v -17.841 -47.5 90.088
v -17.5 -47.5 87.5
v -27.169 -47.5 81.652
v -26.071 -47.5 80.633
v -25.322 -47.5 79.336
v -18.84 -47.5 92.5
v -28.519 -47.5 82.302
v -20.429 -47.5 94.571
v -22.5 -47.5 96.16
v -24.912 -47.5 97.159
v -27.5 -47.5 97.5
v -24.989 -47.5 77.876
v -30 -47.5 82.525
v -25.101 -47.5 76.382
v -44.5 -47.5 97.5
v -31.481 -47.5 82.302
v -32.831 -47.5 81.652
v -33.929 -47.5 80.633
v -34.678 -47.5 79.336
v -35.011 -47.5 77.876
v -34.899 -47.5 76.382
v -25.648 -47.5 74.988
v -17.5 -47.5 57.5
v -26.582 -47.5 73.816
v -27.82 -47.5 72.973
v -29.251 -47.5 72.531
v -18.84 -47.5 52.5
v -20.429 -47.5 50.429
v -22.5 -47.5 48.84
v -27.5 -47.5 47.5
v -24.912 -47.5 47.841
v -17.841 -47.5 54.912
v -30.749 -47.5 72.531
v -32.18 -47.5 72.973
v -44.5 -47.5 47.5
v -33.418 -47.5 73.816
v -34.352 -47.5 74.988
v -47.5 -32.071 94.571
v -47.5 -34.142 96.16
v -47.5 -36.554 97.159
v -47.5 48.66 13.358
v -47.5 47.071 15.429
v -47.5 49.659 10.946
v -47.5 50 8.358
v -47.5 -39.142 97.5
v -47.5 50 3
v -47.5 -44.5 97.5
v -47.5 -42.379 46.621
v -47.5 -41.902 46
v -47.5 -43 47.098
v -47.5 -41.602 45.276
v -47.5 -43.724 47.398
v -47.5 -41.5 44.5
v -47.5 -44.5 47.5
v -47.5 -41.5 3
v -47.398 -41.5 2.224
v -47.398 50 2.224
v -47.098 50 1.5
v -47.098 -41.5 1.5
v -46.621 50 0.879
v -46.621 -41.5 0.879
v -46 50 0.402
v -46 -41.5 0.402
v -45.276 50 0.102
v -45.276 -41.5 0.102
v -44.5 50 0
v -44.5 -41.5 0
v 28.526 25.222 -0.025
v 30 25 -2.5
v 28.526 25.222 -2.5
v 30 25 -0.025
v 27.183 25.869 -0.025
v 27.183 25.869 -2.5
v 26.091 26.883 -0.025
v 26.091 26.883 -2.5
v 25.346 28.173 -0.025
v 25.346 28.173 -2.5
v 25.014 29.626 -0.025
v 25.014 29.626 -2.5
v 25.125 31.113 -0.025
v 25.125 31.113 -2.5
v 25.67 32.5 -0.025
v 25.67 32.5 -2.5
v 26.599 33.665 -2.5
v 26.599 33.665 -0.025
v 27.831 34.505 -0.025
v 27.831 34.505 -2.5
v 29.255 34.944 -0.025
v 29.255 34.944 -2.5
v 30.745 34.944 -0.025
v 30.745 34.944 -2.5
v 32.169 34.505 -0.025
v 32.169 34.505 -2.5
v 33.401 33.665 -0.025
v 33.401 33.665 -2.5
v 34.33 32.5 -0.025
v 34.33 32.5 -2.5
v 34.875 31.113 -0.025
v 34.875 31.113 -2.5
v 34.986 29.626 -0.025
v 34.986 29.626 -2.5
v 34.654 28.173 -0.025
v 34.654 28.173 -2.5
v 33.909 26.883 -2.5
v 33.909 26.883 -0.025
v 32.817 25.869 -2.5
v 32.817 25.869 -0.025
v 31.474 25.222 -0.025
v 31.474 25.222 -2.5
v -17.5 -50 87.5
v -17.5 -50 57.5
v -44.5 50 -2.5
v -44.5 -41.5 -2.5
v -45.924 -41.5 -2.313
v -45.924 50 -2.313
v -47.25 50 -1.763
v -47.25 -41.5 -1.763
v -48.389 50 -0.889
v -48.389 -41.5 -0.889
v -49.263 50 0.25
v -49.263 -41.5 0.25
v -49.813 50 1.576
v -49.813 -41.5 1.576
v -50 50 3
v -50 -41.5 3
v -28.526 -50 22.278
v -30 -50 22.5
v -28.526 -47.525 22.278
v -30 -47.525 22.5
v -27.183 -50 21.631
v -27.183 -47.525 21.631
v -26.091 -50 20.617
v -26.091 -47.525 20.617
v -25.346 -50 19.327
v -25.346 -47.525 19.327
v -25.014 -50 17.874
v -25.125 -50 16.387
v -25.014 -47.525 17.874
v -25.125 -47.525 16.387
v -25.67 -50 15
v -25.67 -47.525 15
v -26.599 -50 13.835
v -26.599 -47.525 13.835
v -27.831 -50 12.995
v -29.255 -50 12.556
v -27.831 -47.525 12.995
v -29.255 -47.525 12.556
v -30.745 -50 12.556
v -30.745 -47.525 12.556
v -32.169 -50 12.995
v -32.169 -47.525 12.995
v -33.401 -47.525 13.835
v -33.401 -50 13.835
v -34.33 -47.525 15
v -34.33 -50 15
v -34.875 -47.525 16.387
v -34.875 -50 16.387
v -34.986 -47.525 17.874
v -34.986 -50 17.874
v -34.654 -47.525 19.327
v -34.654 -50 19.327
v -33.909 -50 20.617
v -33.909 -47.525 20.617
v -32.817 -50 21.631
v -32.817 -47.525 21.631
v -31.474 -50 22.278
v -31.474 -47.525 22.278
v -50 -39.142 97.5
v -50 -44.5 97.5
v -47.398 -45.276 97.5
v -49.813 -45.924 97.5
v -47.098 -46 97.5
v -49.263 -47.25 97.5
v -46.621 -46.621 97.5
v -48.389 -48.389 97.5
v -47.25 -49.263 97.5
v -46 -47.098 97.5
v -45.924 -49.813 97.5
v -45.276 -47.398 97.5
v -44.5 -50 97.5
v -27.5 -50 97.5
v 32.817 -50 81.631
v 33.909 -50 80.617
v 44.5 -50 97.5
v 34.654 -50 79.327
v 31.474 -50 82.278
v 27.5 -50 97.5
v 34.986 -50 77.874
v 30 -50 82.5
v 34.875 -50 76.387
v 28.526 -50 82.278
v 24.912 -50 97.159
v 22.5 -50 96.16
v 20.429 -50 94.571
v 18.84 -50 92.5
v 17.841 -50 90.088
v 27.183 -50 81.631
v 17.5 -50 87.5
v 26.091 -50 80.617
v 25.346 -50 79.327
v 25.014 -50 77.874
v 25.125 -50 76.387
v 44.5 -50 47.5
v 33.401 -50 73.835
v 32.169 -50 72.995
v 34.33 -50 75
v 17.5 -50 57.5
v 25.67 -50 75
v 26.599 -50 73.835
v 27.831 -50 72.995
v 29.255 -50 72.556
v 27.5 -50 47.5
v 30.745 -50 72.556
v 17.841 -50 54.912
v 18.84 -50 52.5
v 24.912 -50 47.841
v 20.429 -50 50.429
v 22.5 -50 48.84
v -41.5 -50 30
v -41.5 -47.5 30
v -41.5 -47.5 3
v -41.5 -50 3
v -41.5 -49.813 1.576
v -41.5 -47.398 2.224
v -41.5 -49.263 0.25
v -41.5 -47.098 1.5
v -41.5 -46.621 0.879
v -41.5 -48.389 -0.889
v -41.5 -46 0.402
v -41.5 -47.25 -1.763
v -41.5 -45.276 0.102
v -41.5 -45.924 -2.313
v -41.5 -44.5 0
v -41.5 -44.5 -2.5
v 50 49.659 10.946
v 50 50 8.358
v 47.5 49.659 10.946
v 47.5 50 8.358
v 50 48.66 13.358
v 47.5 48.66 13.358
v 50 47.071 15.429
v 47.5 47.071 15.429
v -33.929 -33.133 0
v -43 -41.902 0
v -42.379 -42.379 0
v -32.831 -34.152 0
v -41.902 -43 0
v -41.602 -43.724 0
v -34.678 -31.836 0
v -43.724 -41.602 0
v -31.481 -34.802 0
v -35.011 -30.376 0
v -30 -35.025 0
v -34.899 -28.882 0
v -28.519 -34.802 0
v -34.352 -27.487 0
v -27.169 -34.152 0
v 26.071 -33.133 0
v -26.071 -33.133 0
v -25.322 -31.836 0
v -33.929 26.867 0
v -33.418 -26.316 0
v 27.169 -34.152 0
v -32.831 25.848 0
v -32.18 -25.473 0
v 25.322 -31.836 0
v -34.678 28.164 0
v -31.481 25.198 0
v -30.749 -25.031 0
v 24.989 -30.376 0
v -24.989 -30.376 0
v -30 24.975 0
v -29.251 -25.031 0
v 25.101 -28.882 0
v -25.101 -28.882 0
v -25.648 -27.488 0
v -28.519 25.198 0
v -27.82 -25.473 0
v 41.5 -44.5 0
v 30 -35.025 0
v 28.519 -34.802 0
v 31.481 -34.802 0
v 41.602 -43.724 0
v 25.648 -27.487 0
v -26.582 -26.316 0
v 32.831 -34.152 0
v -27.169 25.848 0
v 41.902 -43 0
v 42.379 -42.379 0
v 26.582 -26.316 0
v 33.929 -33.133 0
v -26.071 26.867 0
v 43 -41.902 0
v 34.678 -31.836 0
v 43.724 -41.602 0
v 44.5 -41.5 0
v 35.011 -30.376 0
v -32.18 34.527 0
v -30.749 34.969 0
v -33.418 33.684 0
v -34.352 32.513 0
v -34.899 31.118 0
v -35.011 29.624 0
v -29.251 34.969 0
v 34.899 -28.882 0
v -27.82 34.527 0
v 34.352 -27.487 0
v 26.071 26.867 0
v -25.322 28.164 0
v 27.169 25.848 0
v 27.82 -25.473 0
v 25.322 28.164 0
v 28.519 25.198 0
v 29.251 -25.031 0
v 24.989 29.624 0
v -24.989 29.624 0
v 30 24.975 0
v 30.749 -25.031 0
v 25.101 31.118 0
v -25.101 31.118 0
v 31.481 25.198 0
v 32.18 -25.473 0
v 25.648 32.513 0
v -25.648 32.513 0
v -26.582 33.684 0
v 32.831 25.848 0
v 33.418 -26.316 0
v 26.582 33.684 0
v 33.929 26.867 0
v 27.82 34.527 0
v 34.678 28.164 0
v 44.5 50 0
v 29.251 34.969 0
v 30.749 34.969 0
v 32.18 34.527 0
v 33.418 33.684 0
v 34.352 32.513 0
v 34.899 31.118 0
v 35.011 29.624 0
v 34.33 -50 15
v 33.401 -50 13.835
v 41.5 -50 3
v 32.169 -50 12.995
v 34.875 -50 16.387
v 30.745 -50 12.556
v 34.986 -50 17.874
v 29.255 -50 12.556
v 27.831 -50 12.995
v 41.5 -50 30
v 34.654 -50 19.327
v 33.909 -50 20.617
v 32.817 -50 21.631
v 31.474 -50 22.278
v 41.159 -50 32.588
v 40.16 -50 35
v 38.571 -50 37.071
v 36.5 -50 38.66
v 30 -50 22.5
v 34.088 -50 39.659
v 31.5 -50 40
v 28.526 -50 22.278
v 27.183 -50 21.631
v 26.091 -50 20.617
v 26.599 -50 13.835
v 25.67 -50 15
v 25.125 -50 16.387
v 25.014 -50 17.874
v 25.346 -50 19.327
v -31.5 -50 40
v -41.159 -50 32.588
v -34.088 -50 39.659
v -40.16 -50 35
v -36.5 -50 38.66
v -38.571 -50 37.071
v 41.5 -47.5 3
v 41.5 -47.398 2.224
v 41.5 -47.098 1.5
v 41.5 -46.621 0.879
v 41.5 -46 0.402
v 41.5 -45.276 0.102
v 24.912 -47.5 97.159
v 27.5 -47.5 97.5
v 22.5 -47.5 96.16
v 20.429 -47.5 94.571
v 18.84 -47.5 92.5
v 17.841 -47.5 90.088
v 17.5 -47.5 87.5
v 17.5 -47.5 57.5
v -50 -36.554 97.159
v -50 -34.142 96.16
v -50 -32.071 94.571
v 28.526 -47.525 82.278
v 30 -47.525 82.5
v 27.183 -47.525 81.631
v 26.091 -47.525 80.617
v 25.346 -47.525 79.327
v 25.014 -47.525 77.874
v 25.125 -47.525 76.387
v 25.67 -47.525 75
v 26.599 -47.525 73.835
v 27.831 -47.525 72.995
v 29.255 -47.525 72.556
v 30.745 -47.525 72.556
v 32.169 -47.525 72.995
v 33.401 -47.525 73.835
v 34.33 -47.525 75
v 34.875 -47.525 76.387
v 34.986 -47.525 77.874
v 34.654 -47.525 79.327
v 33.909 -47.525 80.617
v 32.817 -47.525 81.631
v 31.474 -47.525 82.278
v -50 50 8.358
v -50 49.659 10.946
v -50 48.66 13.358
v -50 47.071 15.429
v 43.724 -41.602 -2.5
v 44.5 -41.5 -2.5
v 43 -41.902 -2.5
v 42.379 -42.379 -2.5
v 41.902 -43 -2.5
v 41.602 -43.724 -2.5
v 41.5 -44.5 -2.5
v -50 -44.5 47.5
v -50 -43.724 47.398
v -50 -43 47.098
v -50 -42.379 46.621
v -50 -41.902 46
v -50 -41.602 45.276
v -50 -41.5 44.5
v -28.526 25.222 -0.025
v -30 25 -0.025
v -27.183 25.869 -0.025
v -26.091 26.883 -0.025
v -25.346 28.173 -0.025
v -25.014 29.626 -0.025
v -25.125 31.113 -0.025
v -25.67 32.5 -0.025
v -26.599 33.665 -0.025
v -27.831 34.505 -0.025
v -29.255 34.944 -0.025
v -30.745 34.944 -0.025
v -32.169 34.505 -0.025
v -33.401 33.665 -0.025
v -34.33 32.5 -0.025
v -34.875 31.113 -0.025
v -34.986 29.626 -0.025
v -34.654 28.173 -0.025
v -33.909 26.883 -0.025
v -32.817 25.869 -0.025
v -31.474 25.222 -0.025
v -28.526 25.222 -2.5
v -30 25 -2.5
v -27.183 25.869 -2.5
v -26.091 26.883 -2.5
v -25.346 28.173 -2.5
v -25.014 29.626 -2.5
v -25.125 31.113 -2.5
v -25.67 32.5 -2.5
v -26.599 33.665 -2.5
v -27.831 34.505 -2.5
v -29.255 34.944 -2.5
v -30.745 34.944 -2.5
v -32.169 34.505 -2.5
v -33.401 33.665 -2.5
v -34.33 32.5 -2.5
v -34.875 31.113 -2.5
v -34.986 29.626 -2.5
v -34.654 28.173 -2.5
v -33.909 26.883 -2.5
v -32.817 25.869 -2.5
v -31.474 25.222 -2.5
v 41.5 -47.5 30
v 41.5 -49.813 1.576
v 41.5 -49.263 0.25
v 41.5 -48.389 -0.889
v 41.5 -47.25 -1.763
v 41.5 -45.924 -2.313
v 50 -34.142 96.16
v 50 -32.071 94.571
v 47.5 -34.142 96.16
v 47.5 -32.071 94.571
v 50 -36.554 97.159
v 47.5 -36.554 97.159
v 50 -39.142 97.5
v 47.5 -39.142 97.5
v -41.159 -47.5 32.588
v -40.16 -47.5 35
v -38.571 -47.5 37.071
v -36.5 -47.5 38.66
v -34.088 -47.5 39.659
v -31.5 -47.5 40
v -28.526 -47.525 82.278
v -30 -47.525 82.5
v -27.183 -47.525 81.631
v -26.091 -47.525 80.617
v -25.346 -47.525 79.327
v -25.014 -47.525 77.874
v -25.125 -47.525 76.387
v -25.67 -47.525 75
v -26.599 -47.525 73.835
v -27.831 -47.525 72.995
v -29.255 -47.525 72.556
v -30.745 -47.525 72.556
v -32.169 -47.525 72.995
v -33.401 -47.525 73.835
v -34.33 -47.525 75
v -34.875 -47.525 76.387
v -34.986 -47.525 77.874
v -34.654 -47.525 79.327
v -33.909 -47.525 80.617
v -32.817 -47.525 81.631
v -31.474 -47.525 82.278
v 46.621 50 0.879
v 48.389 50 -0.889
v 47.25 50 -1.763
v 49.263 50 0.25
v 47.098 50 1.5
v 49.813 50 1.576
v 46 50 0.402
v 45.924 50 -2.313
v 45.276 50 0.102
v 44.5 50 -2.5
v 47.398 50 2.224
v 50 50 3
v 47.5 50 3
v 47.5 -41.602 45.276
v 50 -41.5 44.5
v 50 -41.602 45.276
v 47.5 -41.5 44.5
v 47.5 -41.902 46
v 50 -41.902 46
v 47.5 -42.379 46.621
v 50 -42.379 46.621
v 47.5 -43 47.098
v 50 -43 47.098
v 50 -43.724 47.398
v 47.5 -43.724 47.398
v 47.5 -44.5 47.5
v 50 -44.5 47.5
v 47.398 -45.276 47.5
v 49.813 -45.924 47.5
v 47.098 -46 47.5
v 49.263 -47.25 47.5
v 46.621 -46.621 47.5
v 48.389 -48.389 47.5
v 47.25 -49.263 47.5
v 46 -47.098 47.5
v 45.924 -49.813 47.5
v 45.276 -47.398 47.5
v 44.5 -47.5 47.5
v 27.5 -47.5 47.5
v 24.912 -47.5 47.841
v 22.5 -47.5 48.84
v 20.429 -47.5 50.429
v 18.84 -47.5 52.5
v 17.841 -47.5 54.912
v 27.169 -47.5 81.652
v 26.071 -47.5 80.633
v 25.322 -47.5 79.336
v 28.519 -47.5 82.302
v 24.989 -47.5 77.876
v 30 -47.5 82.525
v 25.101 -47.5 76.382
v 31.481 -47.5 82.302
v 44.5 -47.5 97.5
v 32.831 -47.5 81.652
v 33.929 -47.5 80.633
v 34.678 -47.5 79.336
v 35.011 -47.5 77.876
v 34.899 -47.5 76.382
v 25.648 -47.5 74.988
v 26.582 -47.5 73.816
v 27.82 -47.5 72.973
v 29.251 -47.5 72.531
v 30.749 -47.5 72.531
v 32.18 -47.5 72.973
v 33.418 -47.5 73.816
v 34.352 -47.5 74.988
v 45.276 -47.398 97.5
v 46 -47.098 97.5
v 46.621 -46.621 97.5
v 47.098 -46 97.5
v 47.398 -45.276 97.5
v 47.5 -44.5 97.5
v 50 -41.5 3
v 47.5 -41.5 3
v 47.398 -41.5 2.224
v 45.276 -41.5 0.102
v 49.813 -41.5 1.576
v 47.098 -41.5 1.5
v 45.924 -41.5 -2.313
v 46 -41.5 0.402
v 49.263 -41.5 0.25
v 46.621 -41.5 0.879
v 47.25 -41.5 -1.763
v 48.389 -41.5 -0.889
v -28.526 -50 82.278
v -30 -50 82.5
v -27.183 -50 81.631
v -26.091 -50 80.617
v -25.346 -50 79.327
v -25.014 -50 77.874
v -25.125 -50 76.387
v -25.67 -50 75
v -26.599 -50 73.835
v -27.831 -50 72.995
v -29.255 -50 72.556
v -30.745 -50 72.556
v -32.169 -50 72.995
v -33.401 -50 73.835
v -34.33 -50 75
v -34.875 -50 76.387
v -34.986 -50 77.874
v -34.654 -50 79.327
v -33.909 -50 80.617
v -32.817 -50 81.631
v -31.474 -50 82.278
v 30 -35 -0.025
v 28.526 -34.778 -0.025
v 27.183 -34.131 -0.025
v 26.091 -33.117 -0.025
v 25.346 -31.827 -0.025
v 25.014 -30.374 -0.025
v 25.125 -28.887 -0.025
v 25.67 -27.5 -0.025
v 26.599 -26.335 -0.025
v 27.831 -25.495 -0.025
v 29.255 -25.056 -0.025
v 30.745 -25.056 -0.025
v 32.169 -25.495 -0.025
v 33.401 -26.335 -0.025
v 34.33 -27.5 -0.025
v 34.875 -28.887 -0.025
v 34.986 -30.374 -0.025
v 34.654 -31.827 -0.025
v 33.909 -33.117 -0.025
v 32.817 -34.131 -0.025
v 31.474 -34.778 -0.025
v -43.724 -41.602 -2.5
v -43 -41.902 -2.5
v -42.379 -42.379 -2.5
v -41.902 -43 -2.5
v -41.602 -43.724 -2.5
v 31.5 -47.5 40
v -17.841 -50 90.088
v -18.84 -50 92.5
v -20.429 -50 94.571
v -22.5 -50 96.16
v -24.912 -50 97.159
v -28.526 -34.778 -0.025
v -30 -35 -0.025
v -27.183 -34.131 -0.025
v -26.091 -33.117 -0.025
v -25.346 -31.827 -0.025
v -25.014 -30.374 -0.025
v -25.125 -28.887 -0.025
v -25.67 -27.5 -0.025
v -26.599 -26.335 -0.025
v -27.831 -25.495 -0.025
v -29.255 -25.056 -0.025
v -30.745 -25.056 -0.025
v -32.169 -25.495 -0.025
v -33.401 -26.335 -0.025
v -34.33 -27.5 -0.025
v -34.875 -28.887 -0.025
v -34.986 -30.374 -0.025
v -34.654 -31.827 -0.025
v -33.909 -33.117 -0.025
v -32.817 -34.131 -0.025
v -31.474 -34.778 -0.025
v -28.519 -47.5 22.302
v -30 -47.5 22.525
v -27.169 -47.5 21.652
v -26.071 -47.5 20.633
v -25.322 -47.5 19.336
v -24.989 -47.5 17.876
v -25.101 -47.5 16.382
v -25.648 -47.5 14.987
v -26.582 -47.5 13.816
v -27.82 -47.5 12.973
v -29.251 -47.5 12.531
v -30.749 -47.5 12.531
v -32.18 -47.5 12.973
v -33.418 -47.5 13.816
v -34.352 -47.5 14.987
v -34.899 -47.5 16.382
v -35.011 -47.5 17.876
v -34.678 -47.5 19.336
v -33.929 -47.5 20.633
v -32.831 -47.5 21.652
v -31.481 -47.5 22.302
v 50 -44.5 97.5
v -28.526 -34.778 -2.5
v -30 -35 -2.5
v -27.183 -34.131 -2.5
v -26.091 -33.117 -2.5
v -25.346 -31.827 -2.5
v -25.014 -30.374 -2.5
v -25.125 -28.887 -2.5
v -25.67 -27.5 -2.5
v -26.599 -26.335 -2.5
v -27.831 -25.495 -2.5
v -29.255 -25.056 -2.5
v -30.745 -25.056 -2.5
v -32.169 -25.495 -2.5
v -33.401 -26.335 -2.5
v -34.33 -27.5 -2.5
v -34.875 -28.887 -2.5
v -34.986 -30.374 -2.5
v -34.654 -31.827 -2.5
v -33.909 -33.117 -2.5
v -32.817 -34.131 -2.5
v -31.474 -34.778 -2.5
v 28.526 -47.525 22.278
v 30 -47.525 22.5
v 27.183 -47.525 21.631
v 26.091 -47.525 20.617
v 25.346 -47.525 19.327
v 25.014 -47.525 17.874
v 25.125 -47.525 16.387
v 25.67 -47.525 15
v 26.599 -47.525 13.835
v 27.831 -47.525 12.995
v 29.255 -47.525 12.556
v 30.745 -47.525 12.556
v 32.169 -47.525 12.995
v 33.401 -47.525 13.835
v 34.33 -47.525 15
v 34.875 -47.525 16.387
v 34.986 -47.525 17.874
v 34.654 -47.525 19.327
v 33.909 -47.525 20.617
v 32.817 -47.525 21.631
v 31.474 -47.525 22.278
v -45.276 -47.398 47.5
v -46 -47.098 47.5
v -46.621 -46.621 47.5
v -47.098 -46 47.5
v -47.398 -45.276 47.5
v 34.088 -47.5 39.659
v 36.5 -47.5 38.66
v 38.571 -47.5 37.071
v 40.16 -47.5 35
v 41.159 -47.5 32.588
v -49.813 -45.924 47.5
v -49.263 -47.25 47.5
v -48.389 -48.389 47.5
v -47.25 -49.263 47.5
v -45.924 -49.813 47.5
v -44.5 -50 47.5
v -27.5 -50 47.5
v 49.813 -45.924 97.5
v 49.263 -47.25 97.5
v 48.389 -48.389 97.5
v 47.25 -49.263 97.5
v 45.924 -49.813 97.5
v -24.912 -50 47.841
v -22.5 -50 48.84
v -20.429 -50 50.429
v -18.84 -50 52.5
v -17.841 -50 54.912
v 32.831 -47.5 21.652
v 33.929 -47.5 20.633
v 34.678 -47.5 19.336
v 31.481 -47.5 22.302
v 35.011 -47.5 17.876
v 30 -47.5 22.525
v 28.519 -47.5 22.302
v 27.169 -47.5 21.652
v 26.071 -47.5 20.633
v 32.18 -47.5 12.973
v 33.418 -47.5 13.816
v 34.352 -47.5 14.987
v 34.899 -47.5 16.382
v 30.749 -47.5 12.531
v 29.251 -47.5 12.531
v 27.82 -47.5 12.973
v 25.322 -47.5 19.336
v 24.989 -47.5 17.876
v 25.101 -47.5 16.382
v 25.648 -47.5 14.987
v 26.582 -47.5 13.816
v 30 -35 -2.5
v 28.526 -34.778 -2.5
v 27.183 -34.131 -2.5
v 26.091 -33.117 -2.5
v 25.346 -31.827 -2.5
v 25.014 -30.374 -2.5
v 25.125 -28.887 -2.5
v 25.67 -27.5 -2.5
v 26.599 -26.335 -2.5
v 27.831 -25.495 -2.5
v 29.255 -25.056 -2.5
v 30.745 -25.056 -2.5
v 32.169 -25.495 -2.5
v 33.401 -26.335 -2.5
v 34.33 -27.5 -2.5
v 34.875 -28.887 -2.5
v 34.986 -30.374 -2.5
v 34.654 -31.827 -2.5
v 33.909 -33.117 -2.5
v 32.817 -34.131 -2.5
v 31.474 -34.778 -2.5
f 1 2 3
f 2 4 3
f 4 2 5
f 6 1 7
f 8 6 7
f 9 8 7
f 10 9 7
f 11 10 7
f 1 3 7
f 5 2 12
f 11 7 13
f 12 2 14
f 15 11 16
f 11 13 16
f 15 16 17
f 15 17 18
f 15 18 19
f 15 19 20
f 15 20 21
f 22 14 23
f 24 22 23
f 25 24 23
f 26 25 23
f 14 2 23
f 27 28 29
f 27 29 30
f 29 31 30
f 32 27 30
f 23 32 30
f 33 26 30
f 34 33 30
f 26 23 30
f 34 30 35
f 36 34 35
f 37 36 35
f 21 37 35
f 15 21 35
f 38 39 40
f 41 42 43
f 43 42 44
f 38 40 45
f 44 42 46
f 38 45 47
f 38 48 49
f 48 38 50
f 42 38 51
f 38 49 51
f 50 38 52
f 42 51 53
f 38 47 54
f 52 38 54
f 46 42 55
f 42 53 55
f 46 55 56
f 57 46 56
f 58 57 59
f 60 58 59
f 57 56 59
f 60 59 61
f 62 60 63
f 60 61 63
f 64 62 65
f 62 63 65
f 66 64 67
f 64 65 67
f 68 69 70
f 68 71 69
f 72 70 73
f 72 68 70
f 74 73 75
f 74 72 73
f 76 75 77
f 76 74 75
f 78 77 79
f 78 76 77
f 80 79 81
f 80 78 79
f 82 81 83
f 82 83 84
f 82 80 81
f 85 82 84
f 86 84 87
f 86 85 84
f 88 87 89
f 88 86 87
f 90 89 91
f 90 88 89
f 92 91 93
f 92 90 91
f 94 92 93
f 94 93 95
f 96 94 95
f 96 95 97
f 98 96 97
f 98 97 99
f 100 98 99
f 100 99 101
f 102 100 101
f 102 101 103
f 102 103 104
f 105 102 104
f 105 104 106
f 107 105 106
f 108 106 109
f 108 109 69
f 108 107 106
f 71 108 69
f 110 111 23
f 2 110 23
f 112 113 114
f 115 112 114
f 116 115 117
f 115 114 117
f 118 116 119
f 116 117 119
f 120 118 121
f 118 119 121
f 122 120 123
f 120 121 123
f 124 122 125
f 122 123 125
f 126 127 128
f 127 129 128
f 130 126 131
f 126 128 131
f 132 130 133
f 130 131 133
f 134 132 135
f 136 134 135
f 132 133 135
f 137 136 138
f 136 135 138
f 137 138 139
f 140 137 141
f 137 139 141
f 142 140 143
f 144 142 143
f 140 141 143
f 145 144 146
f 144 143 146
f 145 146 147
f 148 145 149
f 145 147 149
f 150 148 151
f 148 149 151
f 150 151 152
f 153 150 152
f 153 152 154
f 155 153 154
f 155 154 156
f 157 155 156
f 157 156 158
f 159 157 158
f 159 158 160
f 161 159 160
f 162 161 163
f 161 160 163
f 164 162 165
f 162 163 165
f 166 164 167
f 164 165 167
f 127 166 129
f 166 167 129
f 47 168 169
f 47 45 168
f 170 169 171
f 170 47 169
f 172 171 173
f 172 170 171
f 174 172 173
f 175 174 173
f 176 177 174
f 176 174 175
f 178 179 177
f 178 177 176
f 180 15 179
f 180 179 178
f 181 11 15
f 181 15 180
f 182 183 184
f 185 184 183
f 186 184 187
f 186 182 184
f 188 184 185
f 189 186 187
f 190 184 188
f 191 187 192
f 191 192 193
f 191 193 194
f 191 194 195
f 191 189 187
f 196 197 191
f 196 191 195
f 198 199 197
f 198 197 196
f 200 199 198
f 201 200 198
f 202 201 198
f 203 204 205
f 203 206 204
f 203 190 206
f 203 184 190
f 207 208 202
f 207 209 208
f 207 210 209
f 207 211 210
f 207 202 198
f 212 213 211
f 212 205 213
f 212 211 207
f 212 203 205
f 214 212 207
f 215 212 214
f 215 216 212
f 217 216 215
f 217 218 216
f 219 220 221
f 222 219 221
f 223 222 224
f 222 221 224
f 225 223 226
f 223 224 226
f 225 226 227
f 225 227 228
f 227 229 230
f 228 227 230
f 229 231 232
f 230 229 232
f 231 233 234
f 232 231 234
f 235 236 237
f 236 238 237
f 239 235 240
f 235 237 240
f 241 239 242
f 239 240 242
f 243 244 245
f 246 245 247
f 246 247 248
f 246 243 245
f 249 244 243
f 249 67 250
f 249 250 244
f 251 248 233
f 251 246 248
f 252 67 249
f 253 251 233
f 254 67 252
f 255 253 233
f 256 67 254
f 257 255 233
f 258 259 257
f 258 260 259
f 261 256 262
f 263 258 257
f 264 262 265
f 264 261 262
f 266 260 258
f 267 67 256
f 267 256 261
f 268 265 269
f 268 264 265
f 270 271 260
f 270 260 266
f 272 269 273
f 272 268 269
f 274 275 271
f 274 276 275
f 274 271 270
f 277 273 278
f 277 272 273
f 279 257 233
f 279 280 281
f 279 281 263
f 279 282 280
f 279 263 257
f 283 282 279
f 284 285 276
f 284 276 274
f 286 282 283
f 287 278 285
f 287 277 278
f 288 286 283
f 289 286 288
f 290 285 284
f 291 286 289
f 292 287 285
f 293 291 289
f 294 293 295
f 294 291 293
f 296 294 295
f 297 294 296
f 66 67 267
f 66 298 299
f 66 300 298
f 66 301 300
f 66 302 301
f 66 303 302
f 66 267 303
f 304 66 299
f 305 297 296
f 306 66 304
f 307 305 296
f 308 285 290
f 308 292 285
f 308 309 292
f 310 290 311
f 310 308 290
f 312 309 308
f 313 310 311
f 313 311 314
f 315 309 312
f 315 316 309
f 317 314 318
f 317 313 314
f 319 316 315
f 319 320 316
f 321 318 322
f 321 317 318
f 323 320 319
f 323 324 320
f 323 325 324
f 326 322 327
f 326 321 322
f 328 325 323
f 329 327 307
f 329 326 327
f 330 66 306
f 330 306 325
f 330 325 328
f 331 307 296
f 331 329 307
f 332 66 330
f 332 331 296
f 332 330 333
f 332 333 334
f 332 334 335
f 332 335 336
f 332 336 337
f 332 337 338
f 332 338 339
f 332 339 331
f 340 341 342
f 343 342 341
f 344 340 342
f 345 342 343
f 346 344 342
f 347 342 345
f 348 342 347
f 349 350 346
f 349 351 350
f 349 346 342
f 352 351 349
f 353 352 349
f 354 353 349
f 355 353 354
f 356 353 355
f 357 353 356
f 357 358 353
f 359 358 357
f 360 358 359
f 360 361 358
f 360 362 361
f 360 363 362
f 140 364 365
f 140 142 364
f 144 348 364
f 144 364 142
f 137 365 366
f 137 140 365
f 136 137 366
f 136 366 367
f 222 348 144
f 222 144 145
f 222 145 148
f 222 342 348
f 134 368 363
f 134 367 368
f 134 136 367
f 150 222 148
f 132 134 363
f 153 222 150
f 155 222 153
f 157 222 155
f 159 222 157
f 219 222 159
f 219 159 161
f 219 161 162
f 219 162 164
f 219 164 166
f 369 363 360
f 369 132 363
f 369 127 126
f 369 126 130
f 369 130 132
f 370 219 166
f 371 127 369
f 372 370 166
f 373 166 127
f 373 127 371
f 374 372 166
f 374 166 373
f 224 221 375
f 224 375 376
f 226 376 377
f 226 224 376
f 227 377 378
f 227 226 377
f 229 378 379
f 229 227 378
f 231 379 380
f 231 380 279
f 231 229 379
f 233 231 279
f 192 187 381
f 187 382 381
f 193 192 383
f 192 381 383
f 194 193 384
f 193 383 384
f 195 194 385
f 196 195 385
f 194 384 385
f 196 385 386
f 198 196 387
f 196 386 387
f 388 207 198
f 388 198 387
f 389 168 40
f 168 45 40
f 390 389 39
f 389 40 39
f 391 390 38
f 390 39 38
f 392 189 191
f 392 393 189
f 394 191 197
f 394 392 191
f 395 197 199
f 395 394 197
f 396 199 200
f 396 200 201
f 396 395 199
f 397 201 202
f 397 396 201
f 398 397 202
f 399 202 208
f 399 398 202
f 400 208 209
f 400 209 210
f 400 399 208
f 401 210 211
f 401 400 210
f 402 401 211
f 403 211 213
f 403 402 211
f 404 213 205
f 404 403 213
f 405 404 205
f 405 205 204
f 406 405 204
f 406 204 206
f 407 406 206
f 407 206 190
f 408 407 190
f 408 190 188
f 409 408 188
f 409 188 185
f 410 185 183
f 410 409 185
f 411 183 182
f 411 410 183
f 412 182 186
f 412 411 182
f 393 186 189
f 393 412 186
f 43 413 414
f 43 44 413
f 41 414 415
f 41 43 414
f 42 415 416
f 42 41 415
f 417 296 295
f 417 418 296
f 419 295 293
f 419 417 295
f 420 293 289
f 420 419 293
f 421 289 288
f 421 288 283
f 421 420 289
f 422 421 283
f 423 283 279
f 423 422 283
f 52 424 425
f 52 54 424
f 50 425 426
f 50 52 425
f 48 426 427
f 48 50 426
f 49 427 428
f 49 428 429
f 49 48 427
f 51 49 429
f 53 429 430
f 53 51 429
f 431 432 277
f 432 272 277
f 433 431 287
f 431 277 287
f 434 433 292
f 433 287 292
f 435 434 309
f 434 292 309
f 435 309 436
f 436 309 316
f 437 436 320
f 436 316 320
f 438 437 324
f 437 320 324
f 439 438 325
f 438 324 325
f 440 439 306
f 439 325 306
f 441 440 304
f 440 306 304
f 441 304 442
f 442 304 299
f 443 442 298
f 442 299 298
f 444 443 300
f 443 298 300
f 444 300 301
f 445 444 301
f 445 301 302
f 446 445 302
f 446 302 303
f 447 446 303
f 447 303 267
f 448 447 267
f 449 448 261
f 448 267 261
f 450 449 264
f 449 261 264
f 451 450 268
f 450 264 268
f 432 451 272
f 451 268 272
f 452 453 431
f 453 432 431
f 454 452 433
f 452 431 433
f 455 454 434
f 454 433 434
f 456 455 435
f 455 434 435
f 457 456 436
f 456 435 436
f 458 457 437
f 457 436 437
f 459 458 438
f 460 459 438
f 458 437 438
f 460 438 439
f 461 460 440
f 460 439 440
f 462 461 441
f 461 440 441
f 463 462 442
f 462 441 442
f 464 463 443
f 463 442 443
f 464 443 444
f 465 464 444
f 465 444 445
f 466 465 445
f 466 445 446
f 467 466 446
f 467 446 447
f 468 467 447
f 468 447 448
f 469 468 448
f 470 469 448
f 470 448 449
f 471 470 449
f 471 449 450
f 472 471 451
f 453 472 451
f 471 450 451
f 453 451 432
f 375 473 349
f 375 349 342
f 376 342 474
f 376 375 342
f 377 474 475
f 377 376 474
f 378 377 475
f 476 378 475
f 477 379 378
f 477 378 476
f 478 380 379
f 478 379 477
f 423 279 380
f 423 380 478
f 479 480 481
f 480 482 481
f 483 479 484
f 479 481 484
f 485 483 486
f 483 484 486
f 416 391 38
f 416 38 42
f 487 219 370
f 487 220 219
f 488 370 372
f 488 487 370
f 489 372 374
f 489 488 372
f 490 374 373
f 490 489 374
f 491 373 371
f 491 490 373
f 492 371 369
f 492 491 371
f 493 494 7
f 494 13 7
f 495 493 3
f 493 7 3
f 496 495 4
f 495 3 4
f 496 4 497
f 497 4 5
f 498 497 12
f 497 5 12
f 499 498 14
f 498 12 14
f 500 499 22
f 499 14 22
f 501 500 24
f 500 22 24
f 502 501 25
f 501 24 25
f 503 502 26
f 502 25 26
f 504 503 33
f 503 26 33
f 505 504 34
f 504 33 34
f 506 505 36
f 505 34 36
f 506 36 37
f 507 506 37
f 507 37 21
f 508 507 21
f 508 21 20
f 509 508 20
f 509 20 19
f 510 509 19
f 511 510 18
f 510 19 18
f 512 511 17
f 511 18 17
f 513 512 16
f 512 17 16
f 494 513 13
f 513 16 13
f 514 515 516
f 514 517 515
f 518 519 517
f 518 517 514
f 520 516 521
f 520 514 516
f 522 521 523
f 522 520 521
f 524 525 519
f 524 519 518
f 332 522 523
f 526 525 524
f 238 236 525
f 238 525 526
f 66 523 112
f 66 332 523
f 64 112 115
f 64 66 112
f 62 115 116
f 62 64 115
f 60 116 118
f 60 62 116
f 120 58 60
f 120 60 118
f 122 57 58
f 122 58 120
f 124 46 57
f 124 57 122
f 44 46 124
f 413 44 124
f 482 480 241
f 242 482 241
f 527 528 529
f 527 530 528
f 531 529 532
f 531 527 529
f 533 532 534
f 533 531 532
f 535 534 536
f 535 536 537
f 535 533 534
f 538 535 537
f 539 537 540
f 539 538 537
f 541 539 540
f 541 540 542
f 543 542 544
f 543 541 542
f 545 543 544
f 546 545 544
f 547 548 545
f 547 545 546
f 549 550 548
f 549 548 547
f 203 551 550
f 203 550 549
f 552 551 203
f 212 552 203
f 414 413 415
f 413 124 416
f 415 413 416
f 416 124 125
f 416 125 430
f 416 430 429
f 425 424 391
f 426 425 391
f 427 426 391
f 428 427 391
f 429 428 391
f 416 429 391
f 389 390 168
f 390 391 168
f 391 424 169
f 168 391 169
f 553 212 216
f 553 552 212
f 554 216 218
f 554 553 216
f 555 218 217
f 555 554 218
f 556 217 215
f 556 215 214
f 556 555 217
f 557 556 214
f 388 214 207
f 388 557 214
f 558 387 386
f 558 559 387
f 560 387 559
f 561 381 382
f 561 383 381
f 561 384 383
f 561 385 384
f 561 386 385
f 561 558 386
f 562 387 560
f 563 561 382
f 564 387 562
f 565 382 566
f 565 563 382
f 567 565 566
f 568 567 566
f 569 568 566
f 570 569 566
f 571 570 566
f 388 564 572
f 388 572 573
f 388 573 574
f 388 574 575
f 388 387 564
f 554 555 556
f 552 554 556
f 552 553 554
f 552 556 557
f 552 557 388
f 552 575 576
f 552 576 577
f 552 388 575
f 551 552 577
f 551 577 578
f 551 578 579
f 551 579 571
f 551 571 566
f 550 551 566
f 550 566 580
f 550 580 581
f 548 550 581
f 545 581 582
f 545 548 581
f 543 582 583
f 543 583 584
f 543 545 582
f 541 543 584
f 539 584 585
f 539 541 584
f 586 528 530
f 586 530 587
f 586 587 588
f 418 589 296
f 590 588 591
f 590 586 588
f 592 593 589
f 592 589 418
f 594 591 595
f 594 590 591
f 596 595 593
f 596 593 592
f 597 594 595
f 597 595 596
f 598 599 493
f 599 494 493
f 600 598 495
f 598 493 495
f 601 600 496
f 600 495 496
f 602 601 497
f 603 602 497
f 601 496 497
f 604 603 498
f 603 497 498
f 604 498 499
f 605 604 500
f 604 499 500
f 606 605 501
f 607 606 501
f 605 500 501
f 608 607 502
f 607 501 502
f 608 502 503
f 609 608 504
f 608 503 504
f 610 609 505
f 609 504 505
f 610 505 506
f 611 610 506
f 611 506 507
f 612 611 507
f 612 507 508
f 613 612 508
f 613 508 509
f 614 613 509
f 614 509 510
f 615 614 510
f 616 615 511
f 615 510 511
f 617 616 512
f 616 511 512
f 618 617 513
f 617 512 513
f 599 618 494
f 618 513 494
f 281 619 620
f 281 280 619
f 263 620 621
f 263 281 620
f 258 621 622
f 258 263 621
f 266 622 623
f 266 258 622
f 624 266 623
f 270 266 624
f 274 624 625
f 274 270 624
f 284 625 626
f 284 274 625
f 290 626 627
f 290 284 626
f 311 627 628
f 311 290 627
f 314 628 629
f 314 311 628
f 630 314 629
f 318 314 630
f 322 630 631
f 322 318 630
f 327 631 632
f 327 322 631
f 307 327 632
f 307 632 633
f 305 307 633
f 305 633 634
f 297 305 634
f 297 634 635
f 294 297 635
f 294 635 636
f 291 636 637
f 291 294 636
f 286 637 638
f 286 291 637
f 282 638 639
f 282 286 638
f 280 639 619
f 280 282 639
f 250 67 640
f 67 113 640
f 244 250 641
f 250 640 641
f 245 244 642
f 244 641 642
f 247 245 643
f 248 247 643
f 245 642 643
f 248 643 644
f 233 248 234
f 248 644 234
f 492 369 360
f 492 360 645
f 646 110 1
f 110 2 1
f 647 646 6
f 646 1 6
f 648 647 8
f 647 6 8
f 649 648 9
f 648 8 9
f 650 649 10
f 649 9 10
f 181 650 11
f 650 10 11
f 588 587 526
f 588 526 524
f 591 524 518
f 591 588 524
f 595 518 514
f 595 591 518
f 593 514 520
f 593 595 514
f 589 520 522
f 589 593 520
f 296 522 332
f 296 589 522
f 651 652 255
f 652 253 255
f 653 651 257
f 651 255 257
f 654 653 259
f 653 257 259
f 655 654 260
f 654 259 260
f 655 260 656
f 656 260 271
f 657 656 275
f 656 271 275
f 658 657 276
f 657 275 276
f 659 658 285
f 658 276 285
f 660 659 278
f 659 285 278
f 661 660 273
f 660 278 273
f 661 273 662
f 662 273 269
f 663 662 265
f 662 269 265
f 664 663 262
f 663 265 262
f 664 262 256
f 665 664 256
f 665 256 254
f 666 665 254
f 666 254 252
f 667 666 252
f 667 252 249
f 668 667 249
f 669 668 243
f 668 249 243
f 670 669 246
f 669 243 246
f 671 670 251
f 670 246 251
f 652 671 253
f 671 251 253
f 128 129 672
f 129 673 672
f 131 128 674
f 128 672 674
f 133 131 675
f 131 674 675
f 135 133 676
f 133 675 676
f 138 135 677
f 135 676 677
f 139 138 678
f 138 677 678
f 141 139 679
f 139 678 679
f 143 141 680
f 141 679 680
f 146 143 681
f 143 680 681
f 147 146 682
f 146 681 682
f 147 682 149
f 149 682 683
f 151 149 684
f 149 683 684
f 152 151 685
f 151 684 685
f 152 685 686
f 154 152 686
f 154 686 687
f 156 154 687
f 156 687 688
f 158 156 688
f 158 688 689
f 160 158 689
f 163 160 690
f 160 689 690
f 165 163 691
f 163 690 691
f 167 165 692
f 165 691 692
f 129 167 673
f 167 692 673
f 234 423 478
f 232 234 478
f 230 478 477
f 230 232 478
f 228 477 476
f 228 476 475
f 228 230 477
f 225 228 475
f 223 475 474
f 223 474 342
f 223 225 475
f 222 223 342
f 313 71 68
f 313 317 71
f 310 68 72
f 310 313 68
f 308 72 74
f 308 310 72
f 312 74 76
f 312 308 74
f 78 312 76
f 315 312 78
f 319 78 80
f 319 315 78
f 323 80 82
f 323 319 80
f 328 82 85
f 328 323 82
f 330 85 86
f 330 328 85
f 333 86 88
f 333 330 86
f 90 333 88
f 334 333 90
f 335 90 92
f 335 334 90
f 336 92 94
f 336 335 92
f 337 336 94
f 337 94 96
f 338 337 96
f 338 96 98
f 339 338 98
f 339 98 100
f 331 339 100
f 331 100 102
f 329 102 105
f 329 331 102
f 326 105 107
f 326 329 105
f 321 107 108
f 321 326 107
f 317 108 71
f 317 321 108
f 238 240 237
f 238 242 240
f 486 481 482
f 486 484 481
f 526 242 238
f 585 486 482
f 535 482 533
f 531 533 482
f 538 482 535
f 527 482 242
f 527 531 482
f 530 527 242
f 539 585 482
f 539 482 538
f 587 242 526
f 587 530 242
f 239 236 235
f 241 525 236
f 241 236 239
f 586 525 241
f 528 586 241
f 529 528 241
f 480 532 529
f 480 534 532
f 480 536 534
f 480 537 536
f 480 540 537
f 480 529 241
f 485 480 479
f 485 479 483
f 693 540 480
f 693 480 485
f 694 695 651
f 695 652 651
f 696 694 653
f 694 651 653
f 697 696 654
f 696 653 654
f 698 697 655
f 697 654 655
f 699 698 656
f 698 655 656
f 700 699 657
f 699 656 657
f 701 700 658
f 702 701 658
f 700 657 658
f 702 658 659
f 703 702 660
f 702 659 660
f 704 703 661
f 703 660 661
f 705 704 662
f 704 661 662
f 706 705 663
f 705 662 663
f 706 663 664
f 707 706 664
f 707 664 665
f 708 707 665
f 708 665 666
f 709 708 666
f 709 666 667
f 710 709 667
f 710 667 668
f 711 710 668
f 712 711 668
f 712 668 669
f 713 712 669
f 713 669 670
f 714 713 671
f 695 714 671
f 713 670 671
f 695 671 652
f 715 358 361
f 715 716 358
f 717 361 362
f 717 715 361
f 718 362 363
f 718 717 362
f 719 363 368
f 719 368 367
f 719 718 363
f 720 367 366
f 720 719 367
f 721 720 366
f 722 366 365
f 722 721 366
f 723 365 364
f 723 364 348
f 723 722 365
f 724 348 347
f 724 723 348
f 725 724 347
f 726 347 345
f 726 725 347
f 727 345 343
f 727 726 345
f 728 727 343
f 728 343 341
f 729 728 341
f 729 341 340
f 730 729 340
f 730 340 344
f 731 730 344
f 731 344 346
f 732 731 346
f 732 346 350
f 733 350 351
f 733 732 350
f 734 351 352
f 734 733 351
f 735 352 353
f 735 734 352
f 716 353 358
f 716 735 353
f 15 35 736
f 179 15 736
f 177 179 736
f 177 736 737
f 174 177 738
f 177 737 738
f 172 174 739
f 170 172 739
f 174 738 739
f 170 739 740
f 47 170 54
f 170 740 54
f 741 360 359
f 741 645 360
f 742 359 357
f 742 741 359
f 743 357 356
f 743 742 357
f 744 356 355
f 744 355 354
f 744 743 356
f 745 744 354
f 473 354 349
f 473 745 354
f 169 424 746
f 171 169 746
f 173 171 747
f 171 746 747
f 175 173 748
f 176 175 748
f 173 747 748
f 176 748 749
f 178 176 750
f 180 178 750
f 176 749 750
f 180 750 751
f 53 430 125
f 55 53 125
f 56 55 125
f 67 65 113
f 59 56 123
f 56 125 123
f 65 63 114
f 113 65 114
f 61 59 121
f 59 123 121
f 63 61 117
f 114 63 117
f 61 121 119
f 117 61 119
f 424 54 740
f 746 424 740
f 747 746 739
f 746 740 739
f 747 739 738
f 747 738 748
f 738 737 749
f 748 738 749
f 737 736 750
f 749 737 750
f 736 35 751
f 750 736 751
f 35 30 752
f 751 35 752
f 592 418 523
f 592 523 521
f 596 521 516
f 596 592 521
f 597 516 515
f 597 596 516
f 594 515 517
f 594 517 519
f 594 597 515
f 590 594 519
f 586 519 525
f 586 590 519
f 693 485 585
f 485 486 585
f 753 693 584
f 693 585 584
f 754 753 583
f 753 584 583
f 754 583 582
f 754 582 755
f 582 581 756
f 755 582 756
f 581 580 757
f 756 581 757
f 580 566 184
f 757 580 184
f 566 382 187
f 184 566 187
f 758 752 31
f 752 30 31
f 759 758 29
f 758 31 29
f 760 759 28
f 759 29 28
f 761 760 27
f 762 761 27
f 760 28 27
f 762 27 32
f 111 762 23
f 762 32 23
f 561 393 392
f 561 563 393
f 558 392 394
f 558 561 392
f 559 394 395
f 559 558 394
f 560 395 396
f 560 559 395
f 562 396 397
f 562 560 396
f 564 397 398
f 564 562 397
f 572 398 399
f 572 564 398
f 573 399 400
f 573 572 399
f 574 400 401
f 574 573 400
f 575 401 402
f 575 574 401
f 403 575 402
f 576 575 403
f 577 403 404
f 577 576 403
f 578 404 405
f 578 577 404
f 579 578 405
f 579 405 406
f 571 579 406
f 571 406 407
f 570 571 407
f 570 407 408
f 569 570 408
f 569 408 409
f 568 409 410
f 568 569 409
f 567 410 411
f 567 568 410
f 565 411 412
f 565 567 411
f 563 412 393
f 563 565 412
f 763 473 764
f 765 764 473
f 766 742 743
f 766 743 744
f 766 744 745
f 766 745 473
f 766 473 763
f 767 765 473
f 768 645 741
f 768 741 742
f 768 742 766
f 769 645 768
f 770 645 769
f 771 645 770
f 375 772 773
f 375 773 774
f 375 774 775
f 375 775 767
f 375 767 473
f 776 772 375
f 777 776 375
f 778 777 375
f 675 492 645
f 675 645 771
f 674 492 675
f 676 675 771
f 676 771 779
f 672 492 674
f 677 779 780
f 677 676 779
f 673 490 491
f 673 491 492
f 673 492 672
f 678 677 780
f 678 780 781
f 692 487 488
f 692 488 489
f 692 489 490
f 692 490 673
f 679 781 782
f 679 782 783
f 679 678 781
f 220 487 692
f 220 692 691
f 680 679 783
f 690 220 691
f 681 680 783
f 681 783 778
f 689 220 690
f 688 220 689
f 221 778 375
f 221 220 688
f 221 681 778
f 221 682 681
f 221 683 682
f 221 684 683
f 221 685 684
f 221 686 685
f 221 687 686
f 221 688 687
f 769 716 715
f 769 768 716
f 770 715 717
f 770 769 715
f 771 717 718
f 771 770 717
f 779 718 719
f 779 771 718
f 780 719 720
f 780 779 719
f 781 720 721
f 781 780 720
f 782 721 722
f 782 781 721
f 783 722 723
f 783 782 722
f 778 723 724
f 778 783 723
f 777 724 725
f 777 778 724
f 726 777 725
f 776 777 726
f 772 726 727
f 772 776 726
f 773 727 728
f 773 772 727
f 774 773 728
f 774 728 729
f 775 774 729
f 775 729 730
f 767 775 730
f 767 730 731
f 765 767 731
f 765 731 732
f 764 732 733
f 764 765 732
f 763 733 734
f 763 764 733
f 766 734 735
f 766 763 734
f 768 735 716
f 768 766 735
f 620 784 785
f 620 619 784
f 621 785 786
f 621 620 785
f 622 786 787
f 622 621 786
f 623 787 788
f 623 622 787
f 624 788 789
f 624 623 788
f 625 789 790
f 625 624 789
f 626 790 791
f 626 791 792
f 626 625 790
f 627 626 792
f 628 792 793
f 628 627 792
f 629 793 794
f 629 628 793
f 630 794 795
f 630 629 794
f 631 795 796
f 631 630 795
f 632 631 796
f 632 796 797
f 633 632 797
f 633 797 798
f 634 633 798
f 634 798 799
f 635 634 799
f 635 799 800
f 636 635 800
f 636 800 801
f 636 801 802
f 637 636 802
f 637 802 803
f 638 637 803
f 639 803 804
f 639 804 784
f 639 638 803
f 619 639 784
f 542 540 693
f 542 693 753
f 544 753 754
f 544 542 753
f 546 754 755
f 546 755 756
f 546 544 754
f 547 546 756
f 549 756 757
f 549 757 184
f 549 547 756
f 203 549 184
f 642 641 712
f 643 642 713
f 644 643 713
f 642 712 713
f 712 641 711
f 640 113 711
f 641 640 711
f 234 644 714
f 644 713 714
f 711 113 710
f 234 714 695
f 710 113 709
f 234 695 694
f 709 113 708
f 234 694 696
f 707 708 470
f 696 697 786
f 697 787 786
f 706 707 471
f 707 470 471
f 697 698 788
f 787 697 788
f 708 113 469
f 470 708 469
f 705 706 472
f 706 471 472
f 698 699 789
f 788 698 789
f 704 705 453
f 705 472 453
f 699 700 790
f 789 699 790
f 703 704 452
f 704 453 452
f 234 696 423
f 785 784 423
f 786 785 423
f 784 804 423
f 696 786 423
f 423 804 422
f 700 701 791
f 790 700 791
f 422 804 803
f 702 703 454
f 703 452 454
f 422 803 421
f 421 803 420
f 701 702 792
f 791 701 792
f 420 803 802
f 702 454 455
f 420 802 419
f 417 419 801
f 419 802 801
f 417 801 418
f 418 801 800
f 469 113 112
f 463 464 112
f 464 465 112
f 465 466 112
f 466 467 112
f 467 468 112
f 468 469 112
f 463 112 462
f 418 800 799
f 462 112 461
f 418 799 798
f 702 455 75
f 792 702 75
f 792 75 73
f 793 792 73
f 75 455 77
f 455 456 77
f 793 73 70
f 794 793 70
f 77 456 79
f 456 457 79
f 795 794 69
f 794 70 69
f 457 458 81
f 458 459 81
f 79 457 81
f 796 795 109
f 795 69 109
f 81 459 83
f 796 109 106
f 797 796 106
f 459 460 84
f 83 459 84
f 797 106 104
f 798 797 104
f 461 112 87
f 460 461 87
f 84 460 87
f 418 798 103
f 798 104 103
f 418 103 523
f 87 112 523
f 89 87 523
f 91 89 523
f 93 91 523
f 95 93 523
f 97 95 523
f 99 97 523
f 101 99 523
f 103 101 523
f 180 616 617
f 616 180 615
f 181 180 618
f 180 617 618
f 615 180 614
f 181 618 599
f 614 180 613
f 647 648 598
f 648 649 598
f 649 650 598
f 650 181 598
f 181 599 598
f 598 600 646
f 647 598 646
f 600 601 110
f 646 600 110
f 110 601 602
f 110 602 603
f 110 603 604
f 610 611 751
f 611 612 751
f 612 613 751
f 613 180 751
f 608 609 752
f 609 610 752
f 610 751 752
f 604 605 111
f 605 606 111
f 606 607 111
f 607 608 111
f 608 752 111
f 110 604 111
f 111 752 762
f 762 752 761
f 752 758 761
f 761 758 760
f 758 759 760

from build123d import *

# Parameters (mm, degrees)
SKETCH1_W                       = 100
SKETCH1_H                       = 100
BASE_FLANGE1_DEPTH              = 2.5
EDGE_FLANGE1_STRIP_W            = 16
EDGE_FLANGE1_STRIP_H            = 2.5
EDGE_FLANGE1_STRIP_CUT_DEPTH    = 83
EDGE_FLANGE1_RELIEF_W           = 17.25
EDGE_FLANGE1_RELIEF_H           = 1.25
EDGE_FLANGE1_RELIEF_CUT_DEPTH   = 2.5
EDGE_FLANGE1_DEPTH              = 83
EDGE_FLANGE2_STRIP_W            = 16
EDGE_FLANGE2_STRIP_H            = 2.5
EDGE_FLANGE2_STRIP_CUT_DEPTH    = 100
EDGE_FLANGE2_DEPTH              = 100
EDGE_FLANGE3_STRIP_W            = 16
EDGE_FLANGE3_STRIP_H            = 2.5
EDGE_FLANGE3_STRIP_CUT_DEPTH    = 50
EDGE_FLANGE3_RELIEF_W           = 17.25
EDGE_FLANGE3_RELIEF_H           = 1.25
EDGE_FLANGE3_RELIEF_CUT_DEPTH   = 2.5
EDGE_FLANGE3_DEPTH              = 50
SKETCH17_W                      = 50
SKETCH17_H                      = 8.5
CUT_EXTRUDE1_DEPTH              = 8.5
CUT_EXTRUDE2_REACH              = 150.345
F_10_0MM_DOWEL_HOLE1_AT_2_COUNT = 2
F_10_0MM_DOWEL_HOLE1_AT_2_PITCH = 60
F_10_0MM_DOWEL_HOLE2_AT_2_COUNT = 2
F_10_0MM_DOWEL_HOLE2_AT_2_PITCH = 60
FILLET3_R                       = 3
FILLET4_R                       = 10


# Sheet-metal steps are written as plain solids
with BuildPart() as part:
    # Sketch1 → Base-Flange1 (new body)
    with BuildSketch(Plane.XY):
        Rectangle(SKETCH1_W, SKETCH1_H)
    extrude(amount=-BASE_FLANGE1_DEPTH)

    # Edge-Flange1 strip (across the edge) → Edge-Flange1 strip cut (cut)
    with BuildSketch(Plane(origin=(-41.5, -50, 0), x_dir=(0, 1, 0), z_dir=(1, 0, 0))):
        with Locations((-2.5, -1.25)):
            Rectangle(EDGE_FLANGE1_STRIP_W, EDGE_FLANGE1_STRIP_H)
    extrude(amount=EDGE_FLANGE1_STRIP_CUT_DEPTH, mode=Mode.SUBTRACT)

    # Edge-Flange1 relief (on the sheet) → Edge-Flange1 relief cut (cut)
    with BuildSketch(Plane(origin=(-41.5, -44.5, 0), x_dir=(0, 1, 0), z_dir=(0, 0, 1))):
        with Locations((-7.375, 0.625)):
            Rectangle(EDGE_FLANGE1_RELIEF_W, EDGE_FLANGE1_RELIEF_H)
        with Locations((-7.375, -83.625)):
            Rectangle(EDGE_FLANGE1_RELIEF_W, EDGE_FLANGE1_RELIEF_H)
    extrude(amount=-EDGE_FLANGE1_RELIEF_CUT_DEPTH, mode=Mode.SUBTRACT)

    # Edge-Flange1 section (across the edge) → Edge-Flange1 (add)
    with BuildSketch(Plane(origin=(-41.5, -50, 0), x_dir=(0, 1, 0), z_dir=(1, 0, 0))):
        with BuildLine():
            Line((0, 3), (0, 40))
            Line((0, 40), (2.5, 40))
            Line((2.5, 40), (2.5, 3))
            ThreePointArc((2.5, 3), (3.378679656, 0.878679656), (5.5, 0))
            Line((5.5, 0), (5.5, -2.5))
            ThreePointArc((5.5, -2.5), (1.610912703, -0.889087297), (0, 3))
        make_face()
    extrude(amount=EDGE_FLANGE1_DEPTH)

    # Edge-Flange2 strip (across the edge) → Edge-Flange2 strip cut (cut)
    with BuildSketch(Plane(origin=(50, -50, 0), x_dir=(-1, 0, 0), z_dir=(0, 1, 0))):
        with Locations((-2.5, -1.25)):
            Rectangle(EDGE_FLANGE2_STRIP_W, EDGE_FLANGE2_STRIP_H)
    edge_flange2_strip_cut = extrude(amount=EDGE_FLANGE2_STRIP_CUT_DEPTH, mode=Mode.SUBTRACT)

    # Edge-Flange2 section (across the edge) → Edge-Flange2 (add)
    with BuildSketch(Plane(origin=(50, -50, 0), x_dir=(-1, 0, 0), z_dir=(0, 1, 0))):
        with BuildLine():
            Line((0, 3), (0, 97.5))
            Line((0, 97.5), (2.5, 97.5))
            Line((2.5, 97.5), (2.5, 3))
            ThreePointArc((2.5, 3), (3.378679656, 0.878679656), (5.5, 0))
            Line((5.5, 0), (5.5, -2.5))
            ThreePointArc((5.5, -2.5), (1.610912703, -0.889087297), (0, 3))
        make_face()
    edge_flange2 = extrude(amount=EDGE_FLANGE2_DEPTH)

    # Edge-Flange3 strip (across the edge) → Edge-Flange3 strip cut (cut)
    with BuildSketch(Plane(origin=(47.5, -50, 47.5), x_dir=(0, 1, 0), z_dir=(0, 0, 1))):
        with Locations((-2.5, -1.25)):
            Rectangle(EDGE_FLANGE3_STRIP_W, EDGE_FLANGE3_STRIP_H)
    edge_flange3_strip_cut = extrude(amount=EDGE_FLANGE3_STRIP_CUT_DEPTH, mode=Mode.SUBTRACT)

    # Edge-Flange3 relief (on the sheet) → Edge-Flange3 relief cut (cut)
    with BuildSketch(Plane(origin=(47.5, -44.5, 47.5), x_dir=(0, 1, 0), z_dir=(-1, 0, 0))):
        with Locations((-7.375, 0.625)):
            Rectangle(EDGE_FLANGE3_RELIEF_W, EDGE_FLANGE3_RELIEF_H)
    edge_flange3_relief_cut = extrude(amount=-EDGE_FLANGE3_RELIEF_CUT_DEPTH, mode=Mode.SUBTRACT)

    # Edge-Flange3 section (across the edge) → Edge-Flange3 (add)
    with BuildSketch(Plane(origin=(47.5, -50, 47.5), x_dir=(0, 1, 0), z_dir=(0, 0, 1))):
        with BuildLine():
            Line((0, 3), (0, 30))
            Line((0, 30), (2.5, 30))
            Line((2.5, 30), (2.5, 3))
            ThreePointArc((2.5, 3), (3.378679656, 0.878679656), (5.5, 0))
            Line((5.5, 0), (5.5, -2.5))
            ThreePointArc((5.5, -2.5), (1.610912703, -0.889087297), (0, 3))
        make_face()
    edge_flange3 = extrude(amount=EDGE_FLANGE3_DEPTH)

    # Sketch17 → Cut-Extrude1 (cut)
    with BuildSketch(Plane(origin=(50, 0, 0), x_dir=(0, 0, -1), z_dir=(1, 0, 0))):
        with Locations((-22.5, -45.75)):
            Rectangle(SKETCH17_W, SKETCH17_H)
    cut_extrude1 = extrude(amount=-CUT_EXTRUDE1_DEPTH, mode=Mode.SUBTRACT)

    # Sketch18 → Cut-Extrude2 (cut, up to next)
    with BuildSketch(Plane(origin=(50, 0, 0), x_dir=(0, 0, -1), z_dir=(1, 0, 0)), mode=Mode.PRIVATE) as cut_extrude2_sk1:
        Polygon((-97.5, 50), (-97.5, -35), (-12.5, 50), align=None)
    cut_extrude2_tool1 = extrude(cut_extrude2_sk1.sketch, amount=-CUT_EXTRUDE2_REACH, mode=Mode.PRIVATE) & part.part
    cut_extrude2 = cut_extrude2_tool1.solids().sort_by_distance((50, 21.666667, 69.166667))[0]
    add(cut_extrude2, mode=Mode.SUBTRACT)

    # Sketch20 → Ø10.0mm Dowel Hole1 (revolve, cut)
    with BuildSketch(Plane(origin=(30, 30, 0), x_dir=(0, -1, 0), z_dir=(1, 0, 0))):
        Polygon((0, 0), (0, 2.5), (5, 2.5), (5, 0.025), (5.025, 0), align=None)
    f_10_0mm_dowel_hole1 = revolve(axis=Axis((30, 30, 6.35), (0, 0, -1)), mode=Mode.SUBTRACT)

    # Ø10.0mm Dowel Hole1 at 2: Ø10.0mm Dowel Hole1 ×2
    with Locations(*[(0, -i * F_10_0MM_DOWEL_HOLE1_AT_2_PITCH, 0) for i in range(1, F_10_0MM_DOWEL_HOLE1_AT_2_COUNT)]):
        add(f_10_0mm_dowel_hole1, mode=Mode.SUBTRACT)

    # Sketch22 → Ø10.0mm Dowel Hole2 (revolve, cut)
    with BuildSketch(Plane(origin=(30, -47.5, 17.5), x_dir=(0, 0, 1), z_dir=(1, 0, 0))):
        Polygon((0, 0), (0, 2.5), (5, 2.5), (5, 0.025), (5.025, 0), align=None)
    f_10_0mm_dowel_hole2 = revolve(axis=Axis((30, -41.15, 17.5), (0, -1, 0)), mode=Mode.SUBTRACT)

    # Ø10.0mm Dowel Hole2 at 2: Ø10.0mm Dowel Hole2 ×2
    with Locations(*[(0, 0, i * F_10_0MM_DOWEL_HOLE2_AT_2_PITCH) for i in range(1, F_10_0MM_DOWEL_HOLE2_AT_2_COUNT)]):
        add(f_10_0mm_dowel_hole2, mode=Mode.SUBTRACT)

    # Mirror3: Edge-Flange2 strip cut, Edge-Flange2, Edge-Flange3 strip cut, Edge-Flange3 relief cut, Edge-Flange3, Cut-Extrude1, Cut-Extrude2, Ø10.0mm Dowel Hole1, Ø10.0mm Dowel Hole2 across plane
    add(edge_flange2_strip_cut.mirror(Plane(origin=(0, 0, 0), x_dir=(0, 0, 1), z_dir=(1, 0, 0))), mode=Mode.SUBTRACT)
    add(edge_flange2.mirror(Plane(origin=(0, 0, 0), x_dir=(0, 0, 1), z_dir=(1, 0, 0))))
    add(edge_flange3_strip_cut.mirror(Plane(origin=(0, 0, 0), x_dir=(0, 0, 1), z_dir=(1, 0, 0))), mode=Mode.SUBTRACT)
    add(edge_flange3_relief_cut.mirror(Plane(origin=(0, 0, 0), x_dir=(0, 0, 1), z_dir=(1, 0, 0))), mode=Mode.SUBTRACT)
    add(edge_flange3.mirror(Plane(origin=(0, 0, 0), x_dir=(0, 0, 1), z_dir=(1, 0, 0))))
    add(cut_extrude1.mirror(Plane(origin=(0, 0, 0), x_dir=(0, 0, 1), z_dir=(1, 0, 0))), mode=Mode.SUBTRACT)
    add(cut_extrude2.mirror(Plane(origin=(0, 0, 0), x_dir=(0, 0, 1), z_dir=(1, 0, 0))), mode=Mode.SUBTRACT)
    add(f_10_0mm_dowel_hole1.mirror(Plane(origin=(0, 0, 0), x_dir=(0, 0, 1), z_dir=(1, 0, 0))), mode=Mode.SUBTRACT)
    add(f_10_0mm_dowel_hole2.mirror(Plane(origin=(0, 0, 0), x_dir=(0, 0, 1), z_dir=(1, 0, 0))), mode=Mode.SUBTRACT)

    # Mirror3 copy 1 sketch → Mirror3 copy 1 (revolve, cut)
    with BuildSketch(Plane(origin=(-30, -30, 0), x_dir=(0, -1, 0), z_dir=(-1, 0, 0))):
        Polygon((0, 0), (0, -2.5), (5, -2.5), (5, -0.025), (5.025, 0), align=None)
    revolve(axis=Axis((-30, -30, 6.35), (0, 0, 1)), mode=Mode.SUBTRACT)

    # Mirror3 copy 2 sketch → Mirror3 copy 2 (revolve, cut)
    with BuildSketch(Plane(origin=(-30, -47.5, 77.5), x_dir=(0, 0, 1), z_dir=(-1, 0, 0))):
        Polygon((0, 0), (0, -2.5), (5, -2.5), (5, -0.025), (5.025, 0), align=None)
    revolve(axis=Axis((-30, -41.15, 77.5), (0, 1, 0)), mode=Mode.SUBTRACT)

    # Fillet3
    fillet3_edges = [part.edges().sort_by_distance(p)[0] for p in [
        (48.75, -41.5, 47.5),
        (41.5, -41.5, -1.25),
        (-48.75, -41.5, 47.5),
        (-41.5, -41.5, -1.25),
    ]]
    fillet(fillet3_edges, radius=FILLET3_R)

    # Fillet4
    fillet4_edges = [part.edges().sort_by_distance(p)[0] for p in [
        (17.5, -48.75, 47.5),
        (17.5, -48.75, 97.5),
        (48.75, 50, 12.5),
        (48.75, -35, 97.5),
        (-17.5, -48.75, 97.5),
        (-17.5, -48.75, 47.5),
        (-48.75, -35, 97.5),
        (-48.75, 50, 12.5),
        (-41.5, -48.75, 40),
        (41.5, -48.75, 40),
    ]]
    fillet(fillet4_edges, radius=FILLET4_R)


solid = part.part
